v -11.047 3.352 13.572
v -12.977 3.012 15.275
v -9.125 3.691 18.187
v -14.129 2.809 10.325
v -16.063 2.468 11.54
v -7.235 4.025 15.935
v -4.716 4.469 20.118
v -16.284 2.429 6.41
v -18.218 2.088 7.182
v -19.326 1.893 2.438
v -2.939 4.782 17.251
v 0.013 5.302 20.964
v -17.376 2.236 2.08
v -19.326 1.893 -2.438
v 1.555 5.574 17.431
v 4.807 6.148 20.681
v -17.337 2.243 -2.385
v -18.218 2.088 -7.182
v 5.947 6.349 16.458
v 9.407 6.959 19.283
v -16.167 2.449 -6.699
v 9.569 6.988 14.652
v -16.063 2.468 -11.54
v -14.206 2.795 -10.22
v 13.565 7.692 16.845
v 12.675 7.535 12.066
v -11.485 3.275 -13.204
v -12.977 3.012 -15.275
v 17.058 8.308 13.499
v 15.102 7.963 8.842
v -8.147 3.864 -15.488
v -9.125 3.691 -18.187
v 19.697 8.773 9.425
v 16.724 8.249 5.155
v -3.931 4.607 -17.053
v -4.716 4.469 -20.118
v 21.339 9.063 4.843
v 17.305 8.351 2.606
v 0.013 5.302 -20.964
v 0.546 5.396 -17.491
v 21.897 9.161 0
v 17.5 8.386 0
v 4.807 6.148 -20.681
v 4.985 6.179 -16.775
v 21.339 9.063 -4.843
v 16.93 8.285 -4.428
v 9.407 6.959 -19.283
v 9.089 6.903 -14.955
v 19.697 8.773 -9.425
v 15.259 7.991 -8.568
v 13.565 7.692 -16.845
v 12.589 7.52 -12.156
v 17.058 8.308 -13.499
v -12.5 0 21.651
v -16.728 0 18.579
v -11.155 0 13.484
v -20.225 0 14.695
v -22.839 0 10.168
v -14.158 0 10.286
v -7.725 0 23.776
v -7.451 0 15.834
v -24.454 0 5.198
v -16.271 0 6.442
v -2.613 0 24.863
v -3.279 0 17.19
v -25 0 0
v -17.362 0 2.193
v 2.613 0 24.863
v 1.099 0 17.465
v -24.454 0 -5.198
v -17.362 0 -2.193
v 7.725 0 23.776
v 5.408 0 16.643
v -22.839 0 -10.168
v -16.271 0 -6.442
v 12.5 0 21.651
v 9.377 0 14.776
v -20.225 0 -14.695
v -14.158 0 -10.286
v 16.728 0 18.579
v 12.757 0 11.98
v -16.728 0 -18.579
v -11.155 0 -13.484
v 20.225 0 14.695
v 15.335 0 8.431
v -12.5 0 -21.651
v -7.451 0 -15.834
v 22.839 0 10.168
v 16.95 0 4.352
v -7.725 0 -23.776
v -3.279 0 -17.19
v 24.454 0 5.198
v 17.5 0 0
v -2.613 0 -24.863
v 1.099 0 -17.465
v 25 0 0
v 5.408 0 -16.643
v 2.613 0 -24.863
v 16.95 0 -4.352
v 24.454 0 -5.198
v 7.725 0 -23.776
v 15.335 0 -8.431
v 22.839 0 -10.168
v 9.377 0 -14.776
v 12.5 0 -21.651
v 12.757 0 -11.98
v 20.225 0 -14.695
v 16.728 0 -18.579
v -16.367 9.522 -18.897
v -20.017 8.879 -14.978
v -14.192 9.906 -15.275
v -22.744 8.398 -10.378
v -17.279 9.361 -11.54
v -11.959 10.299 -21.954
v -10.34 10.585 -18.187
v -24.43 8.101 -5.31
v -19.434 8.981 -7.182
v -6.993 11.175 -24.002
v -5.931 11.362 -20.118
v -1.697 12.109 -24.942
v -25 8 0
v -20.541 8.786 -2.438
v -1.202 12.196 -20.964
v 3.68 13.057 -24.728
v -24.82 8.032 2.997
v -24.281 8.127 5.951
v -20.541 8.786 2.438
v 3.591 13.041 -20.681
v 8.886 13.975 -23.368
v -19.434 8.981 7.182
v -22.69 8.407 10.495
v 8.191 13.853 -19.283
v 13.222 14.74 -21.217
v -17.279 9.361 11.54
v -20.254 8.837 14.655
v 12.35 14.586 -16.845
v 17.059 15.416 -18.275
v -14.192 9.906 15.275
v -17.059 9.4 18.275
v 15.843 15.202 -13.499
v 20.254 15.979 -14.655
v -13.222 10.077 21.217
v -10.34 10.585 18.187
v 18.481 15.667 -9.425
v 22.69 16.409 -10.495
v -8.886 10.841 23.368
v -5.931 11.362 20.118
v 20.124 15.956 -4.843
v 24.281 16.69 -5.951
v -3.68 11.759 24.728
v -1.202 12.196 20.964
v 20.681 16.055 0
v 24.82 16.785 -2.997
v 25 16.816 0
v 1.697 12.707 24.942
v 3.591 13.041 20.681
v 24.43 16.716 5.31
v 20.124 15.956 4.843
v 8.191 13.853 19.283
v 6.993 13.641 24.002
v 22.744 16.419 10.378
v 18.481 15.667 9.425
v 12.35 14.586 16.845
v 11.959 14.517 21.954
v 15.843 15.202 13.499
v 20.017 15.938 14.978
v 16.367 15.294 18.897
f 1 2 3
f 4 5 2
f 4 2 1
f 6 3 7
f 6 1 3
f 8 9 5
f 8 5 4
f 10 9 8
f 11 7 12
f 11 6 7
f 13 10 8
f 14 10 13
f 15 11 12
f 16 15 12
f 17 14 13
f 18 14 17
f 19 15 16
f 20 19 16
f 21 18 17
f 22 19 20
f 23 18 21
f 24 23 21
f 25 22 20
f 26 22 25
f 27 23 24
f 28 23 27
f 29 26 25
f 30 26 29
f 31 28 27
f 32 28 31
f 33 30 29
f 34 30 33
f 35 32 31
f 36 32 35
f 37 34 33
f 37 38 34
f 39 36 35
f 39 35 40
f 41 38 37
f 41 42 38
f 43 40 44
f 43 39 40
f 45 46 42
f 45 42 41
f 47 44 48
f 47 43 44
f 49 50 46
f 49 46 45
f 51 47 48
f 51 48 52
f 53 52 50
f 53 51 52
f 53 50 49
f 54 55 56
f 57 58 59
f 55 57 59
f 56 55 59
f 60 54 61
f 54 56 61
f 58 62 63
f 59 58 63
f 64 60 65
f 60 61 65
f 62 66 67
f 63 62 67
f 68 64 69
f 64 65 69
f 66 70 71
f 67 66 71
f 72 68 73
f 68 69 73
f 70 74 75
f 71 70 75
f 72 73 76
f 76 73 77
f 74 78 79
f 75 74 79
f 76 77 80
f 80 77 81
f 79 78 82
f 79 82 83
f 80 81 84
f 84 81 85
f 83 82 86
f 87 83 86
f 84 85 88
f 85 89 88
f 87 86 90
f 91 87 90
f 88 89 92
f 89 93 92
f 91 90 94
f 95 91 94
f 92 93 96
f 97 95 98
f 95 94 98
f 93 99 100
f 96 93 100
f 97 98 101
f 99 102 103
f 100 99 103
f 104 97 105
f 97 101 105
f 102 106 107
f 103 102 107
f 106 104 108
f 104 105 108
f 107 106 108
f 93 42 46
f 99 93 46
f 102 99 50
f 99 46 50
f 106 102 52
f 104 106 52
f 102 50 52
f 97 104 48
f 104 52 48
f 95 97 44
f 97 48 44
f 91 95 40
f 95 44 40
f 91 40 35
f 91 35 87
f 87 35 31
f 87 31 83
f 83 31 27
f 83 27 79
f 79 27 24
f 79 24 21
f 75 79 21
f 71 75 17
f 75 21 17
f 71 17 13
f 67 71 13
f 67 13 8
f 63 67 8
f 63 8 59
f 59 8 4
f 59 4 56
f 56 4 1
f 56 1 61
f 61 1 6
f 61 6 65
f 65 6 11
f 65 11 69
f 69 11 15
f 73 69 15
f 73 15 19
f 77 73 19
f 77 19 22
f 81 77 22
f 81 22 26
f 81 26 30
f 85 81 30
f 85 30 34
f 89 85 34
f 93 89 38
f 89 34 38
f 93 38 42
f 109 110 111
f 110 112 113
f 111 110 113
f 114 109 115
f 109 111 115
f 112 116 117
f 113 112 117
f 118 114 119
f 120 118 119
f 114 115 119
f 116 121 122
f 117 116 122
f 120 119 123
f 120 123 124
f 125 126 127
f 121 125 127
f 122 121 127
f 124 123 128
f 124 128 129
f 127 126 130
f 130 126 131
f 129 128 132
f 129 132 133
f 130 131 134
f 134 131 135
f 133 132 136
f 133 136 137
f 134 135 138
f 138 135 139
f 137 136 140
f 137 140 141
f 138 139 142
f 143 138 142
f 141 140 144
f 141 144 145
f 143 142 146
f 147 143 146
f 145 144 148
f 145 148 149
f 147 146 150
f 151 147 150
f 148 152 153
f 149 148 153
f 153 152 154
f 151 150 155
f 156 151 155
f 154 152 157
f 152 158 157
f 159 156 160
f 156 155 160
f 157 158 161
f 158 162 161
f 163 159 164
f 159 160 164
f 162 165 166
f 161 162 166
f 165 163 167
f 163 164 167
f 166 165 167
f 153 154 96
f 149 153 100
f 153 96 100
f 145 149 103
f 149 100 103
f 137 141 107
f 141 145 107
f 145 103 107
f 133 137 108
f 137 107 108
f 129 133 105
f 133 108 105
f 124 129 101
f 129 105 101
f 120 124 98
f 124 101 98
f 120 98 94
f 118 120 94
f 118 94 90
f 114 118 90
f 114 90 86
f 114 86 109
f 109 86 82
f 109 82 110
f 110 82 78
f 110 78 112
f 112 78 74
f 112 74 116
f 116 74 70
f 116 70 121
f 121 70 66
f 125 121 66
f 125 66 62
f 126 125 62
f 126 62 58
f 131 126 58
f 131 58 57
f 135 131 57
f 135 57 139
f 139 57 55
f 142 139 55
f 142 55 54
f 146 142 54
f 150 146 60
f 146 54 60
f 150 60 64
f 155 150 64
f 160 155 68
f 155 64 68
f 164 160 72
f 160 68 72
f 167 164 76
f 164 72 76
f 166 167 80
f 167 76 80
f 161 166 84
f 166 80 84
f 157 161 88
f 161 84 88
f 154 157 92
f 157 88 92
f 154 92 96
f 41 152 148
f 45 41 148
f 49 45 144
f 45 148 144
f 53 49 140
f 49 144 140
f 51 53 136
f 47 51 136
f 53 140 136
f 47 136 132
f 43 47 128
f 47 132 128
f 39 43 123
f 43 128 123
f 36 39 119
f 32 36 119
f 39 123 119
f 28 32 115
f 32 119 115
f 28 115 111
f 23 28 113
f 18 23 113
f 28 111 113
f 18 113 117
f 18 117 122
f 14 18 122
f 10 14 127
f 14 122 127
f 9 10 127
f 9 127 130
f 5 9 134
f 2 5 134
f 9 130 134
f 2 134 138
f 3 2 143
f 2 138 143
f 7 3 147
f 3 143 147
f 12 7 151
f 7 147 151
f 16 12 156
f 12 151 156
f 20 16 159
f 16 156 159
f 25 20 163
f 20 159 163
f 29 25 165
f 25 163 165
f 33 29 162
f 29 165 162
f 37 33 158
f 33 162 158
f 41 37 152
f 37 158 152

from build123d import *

# Parameters (mm, degrees)
SKETCH_1_R          = 25
EXTRUDE_1_DEPTH     = 20
SKETCH_2_R          = 17.5
CUT_EXTRUDE_1_DEPTH = 20
CUT_EXTRUDE_2_DEPTH = 38.5
SKETCH_4_R          = 21
CUT_EXTRUDE_3_DEPTH = 7


with BuildPart() as part:
    # 草图1 → 凸台-拉伸1 (new body)
    with BuildSketch(Plane(origin=(0, 0, 0), x_dir=(1, 0, 0), z_dir=(0, 1, 0))):
        Circle(SKETCH_1_R)
    extrude(amount=EXTRUDE_1_DEPTH)

    # 草图2 → 切除-拉伸1 (cut)
    with BuildSketch(Plane(origin=(0, 20, 0), x_dir=(1, 0, 0), z_dir=(0, 1, 0))):
        Circle(SKETCH_2_R)
    extrude(amount=-CUT_EXTRUDE_1_DEPTH, mode=Mode.SUBTRACT)

    # 草图3 → 切除-拉伸2 (cut, symmetric)
    with BuildSketch(Plane.XY):
        Polygon((-25, 8), (27.395295658, 17.238704287), (27.258418327, 39.934275436), (-34.828449814, 34.256390163), align=None)
    extrude(amount=CUT_EXTRUDE_2_DEPTH, both=True, mode=Mode.SUBTRACT)

    # 草图4 → 切除-拉伸3 (cut)
    with BuildSketch(Plane(origin=(-2.121922813, 12.034022275, 0), x_dir=(0.984807753, 0.173648178, 0), z_dir=(-0.173648178, 0.984807753, 0))):
        with Locations((2.154656893, 0)):
            Circle(SKETCH_4_R)
    extrude(amount=-CUT_EXTRUDE_3_DEPTH, mode=Mode.SUBTRACT)


solid = part.part
